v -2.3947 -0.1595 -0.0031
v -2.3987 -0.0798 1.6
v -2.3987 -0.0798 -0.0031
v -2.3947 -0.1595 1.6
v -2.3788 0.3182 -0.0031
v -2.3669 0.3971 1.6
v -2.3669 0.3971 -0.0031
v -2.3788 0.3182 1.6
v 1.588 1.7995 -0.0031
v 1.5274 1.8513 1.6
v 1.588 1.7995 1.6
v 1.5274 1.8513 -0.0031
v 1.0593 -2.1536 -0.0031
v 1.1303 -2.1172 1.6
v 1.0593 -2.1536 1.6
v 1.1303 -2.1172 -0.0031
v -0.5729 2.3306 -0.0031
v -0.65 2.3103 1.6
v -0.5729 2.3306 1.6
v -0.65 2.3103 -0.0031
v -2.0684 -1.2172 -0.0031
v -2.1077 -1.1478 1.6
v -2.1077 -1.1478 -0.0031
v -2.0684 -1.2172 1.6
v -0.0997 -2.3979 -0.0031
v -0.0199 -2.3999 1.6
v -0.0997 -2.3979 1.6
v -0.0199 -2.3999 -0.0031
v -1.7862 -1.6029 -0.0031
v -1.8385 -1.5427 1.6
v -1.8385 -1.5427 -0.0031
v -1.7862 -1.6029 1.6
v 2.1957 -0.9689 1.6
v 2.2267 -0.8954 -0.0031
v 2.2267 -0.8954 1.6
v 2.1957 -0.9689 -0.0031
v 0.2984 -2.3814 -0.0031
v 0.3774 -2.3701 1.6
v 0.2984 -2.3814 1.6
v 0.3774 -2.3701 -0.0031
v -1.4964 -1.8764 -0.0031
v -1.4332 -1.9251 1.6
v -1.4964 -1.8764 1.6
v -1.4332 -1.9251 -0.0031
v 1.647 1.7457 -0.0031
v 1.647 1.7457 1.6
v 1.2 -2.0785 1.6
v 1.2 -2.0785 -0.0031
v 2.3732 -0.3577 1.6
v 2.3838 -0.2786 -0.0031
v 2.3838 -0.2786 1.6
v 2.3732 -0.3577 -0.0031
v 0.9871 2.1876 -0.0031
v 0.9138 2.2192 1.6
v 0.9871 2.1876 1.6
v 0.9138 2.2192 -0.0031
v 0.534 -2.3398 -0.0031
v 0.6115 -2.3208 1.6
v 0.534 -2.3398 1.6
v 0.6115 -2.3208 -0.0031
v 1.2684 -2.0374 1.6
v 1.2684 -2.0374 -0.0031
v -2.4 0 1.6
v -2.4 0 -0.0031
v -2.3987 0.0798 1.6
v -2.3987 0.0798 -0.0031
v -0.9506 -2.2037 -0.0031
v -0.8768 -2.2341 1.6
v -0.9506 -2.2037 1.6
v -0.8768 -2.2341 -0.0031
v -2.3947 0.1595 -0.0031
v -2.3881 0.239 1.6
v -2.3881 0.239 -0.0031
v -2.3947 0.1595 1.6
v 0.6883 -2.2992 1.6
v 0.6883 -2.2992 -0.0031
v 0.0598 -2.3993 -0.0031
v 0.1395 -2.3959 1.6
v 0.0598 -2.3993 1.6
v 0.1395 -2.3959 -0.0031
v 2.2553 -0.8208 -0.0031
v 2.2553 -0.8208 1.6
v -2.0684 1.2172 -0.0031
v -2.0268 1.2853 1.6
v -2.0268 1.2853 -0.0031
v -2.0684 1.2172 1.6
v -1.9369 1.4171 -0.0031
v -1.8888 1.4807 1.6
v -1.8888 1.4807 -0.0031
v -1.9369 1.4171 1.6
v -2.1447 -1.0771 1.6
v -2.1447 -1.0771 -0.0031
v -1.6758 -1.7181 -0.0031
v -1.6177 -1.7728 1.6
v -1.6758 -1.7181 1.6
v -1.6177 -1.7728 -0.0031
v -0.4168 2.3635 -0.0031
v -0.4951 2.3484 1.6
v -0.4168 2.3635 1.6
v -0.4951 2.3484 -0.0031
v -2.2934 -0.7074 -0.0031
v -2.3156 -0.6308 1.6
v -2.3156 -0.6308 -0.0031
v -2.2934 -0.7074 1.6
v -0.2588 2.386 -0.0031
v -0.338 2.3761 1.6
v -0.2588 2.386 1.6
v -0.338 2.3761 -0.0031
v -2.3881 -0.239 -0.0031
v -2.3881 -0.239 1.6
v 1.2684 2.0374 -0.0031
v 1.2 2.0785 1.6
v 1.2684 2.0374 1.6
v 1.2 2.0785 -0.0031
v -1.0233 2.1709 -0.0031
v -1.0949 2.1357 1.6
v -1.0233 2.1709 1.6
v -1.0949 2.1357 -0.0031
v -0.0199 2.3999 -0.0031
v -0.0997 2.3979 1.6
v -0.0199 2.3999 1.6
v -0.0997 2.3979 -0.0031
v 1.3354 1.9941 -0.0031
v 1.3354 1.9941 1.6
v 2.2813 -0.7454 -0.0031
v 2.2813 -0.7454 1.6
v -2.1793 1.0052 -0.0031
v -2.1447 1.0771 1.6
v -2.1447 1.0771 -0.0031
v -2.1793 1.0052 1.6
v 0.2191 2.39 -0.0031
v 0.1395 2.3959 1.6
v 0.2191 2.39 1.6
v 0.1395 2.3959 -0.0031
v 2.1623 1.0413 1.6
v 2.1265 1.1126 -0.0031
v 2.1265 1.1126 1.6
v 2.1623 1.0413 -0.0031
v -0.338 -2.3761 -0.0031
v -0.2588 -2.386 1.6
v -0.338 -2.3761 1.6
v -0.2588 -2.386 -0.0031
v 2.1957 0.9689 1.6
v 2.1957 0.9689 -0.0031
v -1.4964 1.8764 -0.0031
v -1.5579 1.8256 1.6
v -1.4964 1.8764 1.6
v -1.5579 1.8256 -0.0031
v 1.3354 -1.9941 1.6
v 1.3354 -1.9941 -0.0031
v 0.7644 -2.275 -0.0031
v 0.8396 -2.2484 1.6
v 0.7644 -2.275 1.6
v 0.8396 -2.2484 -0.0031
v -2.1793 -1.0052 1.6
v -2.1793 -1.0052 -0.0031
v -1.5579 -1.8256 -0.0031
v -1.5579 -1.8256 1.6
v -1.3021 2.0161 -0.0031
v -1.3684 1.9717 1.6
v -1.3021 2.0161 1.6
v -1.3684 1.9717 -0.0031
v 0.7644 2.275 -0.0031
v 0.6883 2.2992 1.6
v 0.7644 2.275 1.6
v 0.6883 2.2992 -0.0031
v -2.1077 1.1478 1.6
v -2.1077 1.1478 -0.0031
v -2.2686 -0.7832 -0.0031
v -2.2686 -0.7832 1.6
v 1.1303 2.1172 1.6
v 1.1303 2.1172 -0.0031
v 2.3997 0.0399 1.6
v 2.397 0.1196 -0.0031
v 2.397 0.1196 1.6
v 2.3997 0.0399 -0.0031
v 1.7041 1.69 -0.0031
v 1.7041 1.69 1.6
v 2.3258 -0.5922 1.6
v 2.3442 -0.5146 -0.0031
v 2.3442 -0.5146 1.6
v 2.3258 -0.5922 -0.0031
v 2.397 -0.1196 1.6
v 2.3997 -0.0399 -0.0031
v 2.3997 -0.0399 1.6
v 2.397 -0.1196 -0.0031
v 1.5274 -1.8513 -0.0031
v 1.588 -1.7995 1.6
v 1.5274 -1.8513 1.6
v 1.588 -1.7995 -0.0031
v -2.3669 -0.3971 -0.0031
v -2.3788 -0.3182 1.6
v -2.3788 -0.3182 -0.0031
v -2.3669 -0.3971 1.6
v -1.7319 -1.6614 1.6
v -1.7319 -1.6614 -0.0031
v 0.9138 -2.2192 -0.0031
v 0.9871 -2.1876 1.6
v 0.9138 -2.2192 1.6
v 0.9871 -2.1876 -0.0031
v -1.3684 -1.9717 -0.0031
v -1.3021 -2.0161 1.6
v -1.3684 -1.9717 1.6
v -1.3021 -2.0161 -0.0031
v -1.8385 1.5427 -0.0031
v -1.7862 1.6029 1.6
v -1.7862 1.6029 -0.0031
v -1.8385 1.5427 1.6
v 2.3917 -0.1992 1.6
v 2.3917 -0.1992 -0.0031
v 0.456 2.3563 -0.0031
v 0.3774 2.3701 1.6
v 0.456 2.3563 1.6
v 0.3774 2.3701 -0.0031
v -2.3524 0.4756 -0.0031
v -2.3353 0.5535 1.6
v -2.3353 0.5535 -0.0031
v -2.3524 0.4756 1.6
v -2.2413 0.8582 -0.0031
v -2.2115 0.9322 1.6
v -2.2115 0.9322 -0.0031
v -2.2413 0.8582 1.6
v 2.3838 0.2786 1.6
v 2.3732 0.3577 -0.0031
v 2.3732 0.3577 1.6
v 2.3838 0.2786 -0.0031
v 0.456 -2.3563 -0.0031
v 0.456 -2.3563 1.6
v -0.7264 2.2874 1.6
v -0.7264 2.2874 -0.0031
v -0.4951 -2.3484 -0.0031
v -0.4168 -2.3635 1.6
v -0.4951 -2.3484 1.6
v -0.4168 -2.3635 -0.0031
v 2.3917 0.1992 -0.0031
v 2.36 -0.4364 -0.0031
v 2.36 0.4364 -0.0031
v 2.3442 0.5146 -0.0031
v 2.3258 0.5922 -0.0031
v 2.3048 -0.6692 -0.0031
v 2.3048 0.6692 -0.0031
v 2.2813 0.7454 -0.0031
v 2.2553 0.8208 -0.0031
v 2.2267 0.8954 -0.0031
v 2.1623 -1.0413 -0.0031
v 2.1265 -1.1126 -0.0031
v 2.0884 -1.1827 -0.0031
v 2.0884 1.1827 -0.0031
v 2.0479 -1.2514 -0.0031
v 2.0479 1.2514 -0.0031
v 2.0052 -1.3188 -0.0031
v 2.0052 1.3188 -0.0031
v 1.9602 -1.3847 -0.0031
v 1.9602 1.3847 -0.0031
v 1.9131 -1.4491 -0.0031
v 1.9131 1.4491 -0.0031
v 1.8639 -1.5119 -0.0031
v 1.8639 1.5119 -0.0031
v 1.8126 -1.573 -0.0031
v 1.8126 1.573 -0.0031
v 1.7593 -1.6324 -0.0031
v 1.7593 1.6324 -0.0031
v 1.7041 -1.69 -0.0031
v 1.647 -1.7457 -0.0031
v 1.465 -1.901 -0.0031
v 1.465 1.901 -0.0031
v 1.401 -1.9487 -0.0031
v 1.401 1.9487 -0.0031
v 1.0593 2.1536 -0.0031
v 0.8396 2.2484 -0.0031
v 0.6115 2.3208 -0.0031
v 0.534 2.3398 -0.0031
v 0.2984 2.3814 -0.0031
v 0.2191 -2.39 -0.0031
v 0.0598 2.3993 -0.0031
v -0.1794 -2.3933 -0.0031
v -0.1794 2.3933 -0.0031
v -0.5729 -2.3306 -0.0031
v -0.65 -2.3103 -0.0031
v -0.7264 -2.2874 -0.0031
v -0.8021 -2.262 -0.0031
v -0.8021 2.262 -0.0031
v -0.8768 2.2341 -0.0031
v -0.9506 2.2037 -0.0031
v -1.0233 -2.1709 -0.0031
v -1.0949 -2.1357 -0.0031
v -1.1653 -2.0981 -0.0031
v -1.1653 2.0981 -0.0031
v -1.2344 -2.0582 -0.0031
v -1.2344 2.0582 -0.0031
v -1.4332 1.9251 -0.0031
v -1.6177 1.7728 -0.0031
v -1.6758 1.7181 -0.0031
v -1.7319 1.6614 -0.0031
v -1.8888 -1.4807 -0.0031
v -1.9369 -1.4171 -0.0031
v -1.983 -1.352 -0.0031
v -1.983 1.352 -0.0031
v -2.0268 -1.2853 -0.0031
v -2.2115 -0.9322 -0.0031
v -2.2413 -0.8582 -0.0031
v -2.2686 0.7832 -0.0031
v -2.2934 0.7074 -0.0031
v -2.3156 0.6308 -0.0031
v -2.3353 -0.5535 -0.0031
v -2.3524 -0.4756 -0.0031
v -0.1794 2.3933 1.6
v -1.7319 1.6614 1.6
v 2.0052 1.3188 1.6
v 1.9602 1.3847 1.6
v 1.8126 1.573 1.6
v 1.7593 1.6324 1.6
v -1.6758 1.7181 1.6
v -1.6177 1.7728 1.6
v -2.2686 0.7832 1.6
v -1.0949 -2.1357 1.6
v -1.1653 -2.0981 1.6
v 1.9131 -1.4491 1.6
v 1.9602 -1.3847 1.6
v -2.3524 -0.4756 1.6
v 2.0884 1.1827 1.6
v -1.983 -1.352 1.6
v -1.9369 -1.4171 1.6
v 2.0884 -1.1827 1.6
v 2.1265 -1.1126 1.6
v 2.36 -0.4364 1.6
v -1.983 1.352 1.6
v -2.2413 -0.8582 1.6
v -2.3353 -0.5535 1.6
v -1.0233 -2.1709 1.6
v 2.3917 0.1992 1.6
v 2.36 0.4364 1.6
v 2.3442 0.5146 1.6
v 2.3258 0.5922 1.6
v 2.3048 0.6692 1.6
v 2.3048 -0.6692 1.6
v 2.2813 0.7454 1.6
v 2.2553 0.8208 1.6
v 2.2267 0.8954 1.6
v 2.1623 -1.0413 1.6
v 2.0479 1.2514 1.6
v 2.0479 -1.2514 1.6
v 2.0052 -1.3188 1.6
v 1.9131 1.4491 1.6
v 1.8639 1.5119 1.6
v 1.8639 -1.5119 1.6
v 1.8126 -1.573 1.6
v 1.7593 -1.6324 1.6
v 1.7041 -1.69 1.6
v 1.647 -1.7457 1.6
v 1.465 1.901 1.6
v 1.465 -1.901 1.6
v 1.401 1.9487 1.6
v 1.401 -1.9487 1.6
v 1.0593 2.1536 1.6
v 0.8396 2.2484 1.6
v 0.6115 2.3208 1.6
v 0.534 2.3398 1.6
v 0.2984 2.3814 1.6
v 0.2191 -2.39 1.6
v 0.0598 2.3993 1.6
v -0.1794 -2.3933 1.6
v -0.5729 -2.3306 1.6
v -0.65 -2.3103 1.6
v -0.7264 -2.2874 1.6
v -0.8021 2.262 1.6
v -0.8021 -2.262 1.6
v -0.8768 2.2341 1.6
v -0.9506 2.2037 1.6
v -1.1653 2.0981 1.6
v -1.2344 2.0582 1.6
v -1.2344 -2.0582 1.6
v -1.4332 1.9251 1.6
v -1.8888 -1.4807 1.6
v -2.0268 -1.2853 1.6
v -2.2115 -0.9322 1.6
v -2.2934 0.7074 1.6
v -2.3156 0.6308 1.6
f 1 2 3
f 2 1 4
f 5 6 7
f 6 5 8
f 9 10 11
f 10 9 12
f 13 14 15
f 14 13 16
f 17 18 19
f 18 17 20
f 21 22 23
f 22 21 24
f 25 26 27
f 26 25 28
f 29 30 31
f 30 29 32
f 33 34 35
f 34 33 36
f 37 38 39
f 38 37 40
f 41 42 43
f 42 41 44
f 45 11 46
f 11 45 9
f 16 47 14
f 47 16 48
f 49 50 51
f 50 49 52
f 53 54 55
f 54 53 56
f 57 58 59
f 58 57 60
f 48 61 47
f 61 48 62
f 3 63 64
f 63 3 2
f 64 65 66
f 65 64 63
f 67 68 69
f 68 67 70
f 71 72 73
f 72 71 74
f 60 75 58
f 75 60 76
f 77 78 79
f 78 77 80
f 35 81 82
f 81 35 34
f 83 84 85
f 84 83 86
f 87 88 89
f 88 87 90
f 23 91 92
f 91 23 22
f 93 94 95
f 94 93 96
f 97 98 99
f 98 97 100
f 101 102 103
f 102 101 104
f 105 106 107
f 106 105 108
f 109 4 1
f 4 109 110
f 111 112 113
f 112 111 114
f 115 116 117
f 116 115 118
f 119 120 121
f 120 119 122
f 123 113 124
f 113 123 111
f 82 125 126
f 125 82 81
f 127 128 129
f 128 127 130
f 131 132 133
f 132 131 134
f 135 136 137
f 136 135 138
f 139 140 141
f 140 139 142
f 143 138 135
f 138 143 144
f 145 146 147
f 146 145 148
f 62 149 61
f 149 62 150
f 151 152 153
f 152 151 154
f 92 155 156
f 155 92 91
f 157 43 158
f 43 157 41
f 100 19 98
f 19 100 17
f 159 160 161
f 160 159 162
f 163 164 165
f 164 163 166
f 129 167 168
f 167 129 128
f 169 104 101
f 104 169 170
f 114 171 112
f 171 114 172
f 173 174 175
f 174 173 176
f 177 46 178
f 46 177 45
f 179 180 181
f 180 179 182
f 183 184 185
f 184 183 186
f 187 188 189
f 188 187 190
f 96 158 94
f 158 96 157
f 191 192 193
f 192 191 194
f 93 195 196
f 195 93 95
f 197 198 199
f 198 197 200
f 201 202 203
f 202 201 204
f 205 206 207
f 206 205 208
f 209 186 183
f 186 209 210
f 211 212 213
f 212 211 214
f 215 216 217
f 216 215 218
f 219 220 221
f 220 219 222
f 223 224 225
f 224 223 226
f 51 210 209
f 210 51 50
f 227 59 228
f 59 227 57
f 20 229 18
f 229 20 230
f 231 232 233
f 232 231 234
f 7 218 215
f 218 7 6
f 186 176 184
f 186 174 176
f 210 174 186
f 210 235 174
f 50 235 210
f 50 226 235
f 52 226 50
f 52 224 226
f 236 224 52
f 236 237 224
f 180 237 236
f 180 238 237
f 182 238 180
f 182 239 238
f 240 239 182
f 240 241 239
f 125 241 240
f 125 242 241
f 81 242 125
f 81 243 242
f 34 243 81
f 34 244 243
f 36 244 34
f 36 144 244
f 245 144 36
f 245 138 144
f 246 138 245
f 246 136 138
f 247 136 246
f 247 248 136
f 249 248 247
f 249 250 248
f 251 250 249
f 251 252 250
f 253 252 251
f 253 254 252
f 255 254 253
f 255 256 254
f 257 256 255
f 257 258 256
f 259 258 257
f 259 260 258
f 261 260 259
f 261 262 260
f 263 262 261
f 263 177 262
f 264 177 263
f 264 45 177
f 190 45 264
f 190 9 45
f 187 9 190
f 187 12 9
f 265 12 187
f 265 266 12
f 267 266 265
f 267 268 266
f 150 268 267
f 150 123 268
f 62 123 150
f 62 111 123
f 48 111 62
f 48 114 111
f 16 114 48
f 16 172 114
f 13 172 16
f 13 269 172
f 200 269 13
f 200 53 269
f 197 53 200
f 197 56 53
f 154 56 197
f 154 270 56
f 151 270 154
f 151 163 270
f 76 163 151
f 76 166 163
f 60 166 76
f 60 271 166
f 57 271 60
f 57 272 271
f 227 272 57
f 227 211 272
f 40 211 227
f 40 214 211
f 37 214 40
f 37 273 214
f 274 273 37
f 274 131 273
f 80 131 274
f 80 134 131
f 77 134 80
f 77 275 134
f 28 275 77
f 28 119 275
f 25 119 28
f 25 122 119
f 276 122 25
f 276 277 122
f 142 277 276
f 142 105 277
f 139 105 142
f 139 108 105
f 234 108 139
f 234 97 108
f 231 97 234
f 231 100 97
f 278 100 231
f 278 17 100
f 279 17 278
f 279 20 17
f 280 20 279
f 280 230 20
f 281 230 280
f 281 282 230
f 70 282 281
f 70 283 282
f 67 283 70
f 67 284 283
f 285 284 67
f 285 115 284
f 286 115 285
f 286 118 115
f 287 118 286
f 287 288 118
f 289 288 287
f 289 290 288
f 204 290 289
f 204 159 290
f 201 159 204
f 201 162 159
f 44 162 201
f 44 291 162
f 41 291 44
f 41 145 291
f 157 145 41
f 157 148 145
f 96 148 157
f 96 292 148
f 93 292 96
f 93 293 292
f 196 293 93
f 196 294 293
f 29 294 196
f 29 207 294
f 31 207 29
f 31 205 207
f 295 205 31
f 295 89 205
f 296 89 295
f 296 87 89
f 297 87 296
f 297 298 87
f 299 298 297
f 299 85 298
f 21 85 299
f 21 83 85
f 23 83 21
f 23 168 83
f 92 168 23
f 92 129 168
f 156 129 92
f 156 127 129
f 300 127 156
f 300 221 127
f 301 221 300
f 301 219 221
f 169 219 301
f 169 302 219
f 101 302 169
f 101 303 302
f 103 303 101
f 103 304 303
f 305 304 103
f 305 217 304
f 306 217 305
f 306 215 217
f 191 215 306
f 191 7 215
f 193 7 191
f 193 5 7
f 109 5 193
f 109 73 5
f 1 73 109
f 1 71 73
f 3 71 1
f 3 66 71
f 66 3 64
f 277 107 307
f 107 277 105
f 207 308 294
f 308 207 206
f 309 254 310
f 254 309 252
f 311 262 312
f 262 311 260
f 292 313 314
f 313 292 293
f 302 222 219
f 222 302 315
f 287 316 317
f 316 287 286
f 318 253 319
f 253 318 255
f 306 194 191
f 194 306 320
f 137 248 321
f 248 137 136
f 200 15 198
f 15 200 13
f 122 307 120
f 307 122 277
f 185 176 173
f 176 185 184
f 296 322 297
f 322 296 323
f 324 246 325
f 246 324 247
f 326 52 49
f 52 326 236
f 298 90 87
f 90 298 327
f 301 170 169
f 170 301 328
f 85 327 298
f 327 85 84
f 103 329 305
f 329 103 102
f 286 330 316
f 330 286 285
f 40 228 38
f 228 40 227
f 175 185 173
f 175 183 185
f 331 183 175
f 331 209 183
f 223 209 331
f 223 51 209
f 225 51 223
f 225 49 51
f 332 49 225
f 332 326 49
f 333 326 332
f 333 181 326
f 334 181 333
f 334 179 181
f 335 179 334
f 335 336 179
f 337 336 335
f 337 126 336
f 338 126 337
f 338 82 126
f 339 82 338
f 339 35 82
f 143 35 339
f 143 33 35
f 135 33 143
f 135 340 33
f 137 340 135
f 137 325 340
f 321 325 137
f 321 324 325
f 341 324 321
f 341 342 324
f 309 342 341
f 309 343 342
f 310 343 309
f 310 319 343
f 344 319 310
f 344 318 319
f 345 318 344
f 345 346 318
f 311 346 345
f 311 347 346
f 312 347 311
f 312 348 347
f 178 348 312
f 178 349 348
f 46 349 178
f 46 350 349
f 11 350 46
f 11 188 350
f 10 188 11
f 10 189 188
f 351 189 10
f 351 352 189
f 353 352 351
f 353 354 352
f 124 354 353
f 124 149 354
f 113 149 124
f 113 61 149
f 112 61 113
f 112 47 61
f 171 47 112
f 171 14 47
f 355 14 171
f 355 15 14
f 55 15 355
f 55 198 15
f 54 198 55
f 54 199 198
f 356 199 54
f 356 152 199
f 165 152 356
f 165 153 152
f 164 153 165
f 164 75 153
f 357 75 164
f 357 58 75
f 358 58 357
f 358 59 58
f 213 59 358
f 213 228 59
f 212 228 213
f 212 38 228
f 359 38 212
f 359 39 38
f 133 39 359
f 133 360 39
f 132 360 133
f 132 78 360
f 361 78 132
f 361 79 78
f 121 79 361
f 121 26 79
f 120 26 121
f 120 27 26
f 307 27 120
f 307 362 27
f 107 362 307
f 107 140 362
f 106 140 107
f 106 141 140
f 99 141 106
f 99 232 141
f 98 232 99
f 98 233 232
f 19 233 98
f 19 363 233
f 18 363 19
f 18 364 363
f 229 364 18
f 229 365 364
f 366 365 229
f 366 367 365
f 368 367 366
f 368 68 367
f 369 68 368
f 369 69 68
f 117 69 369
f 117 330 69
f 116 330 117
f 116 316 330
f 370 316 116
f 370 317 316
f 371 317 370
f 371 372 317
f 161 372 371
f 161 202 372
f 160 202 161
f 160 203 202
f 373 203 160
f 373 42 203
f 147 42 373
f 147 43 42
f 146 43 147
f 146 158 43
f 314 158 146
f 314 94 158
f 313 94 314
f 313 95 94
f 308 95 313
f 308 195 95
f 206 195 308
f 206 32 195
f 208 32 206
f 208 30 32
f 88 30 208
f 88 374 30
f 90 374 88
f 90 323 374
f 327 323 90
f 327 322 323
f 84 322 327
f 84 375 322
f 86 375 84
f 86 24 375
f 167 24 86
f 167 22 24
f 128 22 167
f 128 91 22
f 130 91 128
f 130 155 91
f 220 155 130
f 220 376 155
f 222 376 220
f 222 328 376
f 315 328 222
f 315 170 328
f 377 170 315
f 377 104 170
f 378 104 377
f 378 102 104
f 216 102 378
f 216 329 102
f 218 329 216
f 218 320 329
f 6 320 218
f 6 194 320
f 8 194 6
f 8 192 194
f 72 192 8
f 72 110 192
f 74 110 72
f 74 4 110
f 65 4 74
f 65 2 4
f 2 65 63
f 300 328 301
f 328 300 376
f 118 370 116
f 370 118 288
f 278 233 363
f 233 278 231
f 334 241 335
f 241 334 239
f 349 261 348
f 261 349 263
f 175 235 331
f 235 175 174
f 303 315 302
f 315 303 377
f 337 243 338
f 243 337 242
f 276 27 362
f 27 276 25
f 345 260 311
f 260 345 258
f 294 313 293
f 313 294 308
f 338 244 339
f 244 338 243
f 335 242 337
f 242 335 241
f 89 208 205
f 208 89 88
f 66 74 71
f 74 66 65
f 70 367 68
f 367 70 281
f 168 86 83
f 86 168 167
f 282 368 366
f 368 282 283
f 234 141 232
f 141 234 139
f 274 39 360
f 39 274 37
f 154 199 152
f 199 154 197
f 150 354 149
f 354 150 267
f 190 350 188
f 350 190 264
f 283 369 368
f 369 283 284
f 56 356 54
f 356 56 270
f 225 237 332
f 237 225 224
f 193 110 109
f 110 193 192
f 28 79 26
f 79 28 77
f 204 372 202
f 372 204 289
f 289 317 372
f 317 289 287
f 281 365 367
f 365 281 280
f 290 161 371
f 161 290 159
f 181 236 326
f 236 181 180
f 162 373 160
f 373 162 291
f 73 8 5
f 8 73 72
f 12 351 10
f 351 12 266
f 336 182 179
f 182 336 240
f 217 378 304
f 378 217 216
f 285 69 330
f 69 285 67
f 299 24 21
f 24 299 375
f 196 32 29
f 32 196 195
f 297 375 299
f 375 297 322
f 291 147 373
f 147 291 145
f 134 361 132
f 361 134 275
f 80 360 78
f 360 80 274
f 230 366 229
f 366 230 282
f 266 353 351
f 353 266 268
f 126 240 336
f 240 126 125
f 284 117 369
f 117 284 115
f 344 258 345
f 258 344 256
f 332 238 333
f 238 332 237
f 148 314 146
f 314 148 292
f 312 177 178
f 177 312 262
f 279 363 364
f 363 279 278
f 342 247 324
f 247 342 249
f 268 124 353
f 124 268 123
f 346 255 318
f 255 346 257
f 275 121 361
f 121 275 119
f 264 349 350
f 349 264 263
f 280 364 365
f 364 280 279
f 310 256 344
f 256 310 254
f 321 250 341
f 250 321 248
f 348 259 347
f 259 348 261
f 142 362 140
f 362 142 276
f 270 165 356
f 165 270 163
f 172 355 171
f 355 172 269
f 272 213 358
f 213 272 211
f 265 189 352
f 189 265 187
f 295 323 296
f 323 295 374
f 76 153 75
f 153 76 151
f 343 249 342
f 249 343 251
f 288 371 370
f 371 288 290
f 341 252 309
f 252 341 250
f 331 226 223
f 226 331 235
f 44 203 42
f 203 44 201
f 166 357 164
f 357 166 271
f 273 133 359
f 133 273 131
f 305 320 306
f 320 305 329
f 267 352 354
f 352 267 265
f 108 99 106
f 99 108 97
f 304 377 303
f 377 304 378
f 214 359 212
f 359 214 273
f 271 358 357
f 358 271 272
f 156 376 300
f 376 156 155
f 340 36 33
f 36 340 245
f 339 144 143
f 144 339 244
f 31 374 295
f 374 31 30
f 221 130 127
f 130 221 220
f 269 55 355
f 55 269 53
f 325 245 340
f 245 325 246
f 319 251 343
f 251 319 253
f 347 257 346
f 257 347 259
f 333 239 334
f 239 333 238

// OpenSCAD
use <../lib.scad>
use <3996.scad>
$fa=1; $fs=0.2;
function ldraw_lib__691(realsolid=false) = [
// 0 ~Moved to 3996
// 0 Name: 691.dat
// 0 Author: [PTadmin]
// 0 !LDRAW_ORG Part UPDATE 2018-01
// 0 !LICENSE Licensed under CC BY 4.0 : see CAreadme.txt
// 
// 0 BFC CERTIFY CCW
  [0,"BFC","CERTIFY"],
  [0,"BFC","CCW"],
// 
// 0 !HISTORY 2018-01-30 [PTadmin] Official Update 2018-01
// 
// 
// 0 // Door 1 x 6 x 2 Left
// 1 16 0 0 0 1 0 0 0 1 0 0 0 1 3996.dat
  [1,16,0,0,0,1,0,0,0,1,0,0,0,1, ldraw_lib__3996(realsolid)],
];
module ldraw_lib__691(step=0, col=false, unit=2/5, alt=false, line=0.2, solid=!$preview)
    makepoly(ldraw_lib__691(solid), step=step, col=col, unit=unit, alt=alt, line=line, solid=solid);
ldraw_lib__691(line=0.2);
